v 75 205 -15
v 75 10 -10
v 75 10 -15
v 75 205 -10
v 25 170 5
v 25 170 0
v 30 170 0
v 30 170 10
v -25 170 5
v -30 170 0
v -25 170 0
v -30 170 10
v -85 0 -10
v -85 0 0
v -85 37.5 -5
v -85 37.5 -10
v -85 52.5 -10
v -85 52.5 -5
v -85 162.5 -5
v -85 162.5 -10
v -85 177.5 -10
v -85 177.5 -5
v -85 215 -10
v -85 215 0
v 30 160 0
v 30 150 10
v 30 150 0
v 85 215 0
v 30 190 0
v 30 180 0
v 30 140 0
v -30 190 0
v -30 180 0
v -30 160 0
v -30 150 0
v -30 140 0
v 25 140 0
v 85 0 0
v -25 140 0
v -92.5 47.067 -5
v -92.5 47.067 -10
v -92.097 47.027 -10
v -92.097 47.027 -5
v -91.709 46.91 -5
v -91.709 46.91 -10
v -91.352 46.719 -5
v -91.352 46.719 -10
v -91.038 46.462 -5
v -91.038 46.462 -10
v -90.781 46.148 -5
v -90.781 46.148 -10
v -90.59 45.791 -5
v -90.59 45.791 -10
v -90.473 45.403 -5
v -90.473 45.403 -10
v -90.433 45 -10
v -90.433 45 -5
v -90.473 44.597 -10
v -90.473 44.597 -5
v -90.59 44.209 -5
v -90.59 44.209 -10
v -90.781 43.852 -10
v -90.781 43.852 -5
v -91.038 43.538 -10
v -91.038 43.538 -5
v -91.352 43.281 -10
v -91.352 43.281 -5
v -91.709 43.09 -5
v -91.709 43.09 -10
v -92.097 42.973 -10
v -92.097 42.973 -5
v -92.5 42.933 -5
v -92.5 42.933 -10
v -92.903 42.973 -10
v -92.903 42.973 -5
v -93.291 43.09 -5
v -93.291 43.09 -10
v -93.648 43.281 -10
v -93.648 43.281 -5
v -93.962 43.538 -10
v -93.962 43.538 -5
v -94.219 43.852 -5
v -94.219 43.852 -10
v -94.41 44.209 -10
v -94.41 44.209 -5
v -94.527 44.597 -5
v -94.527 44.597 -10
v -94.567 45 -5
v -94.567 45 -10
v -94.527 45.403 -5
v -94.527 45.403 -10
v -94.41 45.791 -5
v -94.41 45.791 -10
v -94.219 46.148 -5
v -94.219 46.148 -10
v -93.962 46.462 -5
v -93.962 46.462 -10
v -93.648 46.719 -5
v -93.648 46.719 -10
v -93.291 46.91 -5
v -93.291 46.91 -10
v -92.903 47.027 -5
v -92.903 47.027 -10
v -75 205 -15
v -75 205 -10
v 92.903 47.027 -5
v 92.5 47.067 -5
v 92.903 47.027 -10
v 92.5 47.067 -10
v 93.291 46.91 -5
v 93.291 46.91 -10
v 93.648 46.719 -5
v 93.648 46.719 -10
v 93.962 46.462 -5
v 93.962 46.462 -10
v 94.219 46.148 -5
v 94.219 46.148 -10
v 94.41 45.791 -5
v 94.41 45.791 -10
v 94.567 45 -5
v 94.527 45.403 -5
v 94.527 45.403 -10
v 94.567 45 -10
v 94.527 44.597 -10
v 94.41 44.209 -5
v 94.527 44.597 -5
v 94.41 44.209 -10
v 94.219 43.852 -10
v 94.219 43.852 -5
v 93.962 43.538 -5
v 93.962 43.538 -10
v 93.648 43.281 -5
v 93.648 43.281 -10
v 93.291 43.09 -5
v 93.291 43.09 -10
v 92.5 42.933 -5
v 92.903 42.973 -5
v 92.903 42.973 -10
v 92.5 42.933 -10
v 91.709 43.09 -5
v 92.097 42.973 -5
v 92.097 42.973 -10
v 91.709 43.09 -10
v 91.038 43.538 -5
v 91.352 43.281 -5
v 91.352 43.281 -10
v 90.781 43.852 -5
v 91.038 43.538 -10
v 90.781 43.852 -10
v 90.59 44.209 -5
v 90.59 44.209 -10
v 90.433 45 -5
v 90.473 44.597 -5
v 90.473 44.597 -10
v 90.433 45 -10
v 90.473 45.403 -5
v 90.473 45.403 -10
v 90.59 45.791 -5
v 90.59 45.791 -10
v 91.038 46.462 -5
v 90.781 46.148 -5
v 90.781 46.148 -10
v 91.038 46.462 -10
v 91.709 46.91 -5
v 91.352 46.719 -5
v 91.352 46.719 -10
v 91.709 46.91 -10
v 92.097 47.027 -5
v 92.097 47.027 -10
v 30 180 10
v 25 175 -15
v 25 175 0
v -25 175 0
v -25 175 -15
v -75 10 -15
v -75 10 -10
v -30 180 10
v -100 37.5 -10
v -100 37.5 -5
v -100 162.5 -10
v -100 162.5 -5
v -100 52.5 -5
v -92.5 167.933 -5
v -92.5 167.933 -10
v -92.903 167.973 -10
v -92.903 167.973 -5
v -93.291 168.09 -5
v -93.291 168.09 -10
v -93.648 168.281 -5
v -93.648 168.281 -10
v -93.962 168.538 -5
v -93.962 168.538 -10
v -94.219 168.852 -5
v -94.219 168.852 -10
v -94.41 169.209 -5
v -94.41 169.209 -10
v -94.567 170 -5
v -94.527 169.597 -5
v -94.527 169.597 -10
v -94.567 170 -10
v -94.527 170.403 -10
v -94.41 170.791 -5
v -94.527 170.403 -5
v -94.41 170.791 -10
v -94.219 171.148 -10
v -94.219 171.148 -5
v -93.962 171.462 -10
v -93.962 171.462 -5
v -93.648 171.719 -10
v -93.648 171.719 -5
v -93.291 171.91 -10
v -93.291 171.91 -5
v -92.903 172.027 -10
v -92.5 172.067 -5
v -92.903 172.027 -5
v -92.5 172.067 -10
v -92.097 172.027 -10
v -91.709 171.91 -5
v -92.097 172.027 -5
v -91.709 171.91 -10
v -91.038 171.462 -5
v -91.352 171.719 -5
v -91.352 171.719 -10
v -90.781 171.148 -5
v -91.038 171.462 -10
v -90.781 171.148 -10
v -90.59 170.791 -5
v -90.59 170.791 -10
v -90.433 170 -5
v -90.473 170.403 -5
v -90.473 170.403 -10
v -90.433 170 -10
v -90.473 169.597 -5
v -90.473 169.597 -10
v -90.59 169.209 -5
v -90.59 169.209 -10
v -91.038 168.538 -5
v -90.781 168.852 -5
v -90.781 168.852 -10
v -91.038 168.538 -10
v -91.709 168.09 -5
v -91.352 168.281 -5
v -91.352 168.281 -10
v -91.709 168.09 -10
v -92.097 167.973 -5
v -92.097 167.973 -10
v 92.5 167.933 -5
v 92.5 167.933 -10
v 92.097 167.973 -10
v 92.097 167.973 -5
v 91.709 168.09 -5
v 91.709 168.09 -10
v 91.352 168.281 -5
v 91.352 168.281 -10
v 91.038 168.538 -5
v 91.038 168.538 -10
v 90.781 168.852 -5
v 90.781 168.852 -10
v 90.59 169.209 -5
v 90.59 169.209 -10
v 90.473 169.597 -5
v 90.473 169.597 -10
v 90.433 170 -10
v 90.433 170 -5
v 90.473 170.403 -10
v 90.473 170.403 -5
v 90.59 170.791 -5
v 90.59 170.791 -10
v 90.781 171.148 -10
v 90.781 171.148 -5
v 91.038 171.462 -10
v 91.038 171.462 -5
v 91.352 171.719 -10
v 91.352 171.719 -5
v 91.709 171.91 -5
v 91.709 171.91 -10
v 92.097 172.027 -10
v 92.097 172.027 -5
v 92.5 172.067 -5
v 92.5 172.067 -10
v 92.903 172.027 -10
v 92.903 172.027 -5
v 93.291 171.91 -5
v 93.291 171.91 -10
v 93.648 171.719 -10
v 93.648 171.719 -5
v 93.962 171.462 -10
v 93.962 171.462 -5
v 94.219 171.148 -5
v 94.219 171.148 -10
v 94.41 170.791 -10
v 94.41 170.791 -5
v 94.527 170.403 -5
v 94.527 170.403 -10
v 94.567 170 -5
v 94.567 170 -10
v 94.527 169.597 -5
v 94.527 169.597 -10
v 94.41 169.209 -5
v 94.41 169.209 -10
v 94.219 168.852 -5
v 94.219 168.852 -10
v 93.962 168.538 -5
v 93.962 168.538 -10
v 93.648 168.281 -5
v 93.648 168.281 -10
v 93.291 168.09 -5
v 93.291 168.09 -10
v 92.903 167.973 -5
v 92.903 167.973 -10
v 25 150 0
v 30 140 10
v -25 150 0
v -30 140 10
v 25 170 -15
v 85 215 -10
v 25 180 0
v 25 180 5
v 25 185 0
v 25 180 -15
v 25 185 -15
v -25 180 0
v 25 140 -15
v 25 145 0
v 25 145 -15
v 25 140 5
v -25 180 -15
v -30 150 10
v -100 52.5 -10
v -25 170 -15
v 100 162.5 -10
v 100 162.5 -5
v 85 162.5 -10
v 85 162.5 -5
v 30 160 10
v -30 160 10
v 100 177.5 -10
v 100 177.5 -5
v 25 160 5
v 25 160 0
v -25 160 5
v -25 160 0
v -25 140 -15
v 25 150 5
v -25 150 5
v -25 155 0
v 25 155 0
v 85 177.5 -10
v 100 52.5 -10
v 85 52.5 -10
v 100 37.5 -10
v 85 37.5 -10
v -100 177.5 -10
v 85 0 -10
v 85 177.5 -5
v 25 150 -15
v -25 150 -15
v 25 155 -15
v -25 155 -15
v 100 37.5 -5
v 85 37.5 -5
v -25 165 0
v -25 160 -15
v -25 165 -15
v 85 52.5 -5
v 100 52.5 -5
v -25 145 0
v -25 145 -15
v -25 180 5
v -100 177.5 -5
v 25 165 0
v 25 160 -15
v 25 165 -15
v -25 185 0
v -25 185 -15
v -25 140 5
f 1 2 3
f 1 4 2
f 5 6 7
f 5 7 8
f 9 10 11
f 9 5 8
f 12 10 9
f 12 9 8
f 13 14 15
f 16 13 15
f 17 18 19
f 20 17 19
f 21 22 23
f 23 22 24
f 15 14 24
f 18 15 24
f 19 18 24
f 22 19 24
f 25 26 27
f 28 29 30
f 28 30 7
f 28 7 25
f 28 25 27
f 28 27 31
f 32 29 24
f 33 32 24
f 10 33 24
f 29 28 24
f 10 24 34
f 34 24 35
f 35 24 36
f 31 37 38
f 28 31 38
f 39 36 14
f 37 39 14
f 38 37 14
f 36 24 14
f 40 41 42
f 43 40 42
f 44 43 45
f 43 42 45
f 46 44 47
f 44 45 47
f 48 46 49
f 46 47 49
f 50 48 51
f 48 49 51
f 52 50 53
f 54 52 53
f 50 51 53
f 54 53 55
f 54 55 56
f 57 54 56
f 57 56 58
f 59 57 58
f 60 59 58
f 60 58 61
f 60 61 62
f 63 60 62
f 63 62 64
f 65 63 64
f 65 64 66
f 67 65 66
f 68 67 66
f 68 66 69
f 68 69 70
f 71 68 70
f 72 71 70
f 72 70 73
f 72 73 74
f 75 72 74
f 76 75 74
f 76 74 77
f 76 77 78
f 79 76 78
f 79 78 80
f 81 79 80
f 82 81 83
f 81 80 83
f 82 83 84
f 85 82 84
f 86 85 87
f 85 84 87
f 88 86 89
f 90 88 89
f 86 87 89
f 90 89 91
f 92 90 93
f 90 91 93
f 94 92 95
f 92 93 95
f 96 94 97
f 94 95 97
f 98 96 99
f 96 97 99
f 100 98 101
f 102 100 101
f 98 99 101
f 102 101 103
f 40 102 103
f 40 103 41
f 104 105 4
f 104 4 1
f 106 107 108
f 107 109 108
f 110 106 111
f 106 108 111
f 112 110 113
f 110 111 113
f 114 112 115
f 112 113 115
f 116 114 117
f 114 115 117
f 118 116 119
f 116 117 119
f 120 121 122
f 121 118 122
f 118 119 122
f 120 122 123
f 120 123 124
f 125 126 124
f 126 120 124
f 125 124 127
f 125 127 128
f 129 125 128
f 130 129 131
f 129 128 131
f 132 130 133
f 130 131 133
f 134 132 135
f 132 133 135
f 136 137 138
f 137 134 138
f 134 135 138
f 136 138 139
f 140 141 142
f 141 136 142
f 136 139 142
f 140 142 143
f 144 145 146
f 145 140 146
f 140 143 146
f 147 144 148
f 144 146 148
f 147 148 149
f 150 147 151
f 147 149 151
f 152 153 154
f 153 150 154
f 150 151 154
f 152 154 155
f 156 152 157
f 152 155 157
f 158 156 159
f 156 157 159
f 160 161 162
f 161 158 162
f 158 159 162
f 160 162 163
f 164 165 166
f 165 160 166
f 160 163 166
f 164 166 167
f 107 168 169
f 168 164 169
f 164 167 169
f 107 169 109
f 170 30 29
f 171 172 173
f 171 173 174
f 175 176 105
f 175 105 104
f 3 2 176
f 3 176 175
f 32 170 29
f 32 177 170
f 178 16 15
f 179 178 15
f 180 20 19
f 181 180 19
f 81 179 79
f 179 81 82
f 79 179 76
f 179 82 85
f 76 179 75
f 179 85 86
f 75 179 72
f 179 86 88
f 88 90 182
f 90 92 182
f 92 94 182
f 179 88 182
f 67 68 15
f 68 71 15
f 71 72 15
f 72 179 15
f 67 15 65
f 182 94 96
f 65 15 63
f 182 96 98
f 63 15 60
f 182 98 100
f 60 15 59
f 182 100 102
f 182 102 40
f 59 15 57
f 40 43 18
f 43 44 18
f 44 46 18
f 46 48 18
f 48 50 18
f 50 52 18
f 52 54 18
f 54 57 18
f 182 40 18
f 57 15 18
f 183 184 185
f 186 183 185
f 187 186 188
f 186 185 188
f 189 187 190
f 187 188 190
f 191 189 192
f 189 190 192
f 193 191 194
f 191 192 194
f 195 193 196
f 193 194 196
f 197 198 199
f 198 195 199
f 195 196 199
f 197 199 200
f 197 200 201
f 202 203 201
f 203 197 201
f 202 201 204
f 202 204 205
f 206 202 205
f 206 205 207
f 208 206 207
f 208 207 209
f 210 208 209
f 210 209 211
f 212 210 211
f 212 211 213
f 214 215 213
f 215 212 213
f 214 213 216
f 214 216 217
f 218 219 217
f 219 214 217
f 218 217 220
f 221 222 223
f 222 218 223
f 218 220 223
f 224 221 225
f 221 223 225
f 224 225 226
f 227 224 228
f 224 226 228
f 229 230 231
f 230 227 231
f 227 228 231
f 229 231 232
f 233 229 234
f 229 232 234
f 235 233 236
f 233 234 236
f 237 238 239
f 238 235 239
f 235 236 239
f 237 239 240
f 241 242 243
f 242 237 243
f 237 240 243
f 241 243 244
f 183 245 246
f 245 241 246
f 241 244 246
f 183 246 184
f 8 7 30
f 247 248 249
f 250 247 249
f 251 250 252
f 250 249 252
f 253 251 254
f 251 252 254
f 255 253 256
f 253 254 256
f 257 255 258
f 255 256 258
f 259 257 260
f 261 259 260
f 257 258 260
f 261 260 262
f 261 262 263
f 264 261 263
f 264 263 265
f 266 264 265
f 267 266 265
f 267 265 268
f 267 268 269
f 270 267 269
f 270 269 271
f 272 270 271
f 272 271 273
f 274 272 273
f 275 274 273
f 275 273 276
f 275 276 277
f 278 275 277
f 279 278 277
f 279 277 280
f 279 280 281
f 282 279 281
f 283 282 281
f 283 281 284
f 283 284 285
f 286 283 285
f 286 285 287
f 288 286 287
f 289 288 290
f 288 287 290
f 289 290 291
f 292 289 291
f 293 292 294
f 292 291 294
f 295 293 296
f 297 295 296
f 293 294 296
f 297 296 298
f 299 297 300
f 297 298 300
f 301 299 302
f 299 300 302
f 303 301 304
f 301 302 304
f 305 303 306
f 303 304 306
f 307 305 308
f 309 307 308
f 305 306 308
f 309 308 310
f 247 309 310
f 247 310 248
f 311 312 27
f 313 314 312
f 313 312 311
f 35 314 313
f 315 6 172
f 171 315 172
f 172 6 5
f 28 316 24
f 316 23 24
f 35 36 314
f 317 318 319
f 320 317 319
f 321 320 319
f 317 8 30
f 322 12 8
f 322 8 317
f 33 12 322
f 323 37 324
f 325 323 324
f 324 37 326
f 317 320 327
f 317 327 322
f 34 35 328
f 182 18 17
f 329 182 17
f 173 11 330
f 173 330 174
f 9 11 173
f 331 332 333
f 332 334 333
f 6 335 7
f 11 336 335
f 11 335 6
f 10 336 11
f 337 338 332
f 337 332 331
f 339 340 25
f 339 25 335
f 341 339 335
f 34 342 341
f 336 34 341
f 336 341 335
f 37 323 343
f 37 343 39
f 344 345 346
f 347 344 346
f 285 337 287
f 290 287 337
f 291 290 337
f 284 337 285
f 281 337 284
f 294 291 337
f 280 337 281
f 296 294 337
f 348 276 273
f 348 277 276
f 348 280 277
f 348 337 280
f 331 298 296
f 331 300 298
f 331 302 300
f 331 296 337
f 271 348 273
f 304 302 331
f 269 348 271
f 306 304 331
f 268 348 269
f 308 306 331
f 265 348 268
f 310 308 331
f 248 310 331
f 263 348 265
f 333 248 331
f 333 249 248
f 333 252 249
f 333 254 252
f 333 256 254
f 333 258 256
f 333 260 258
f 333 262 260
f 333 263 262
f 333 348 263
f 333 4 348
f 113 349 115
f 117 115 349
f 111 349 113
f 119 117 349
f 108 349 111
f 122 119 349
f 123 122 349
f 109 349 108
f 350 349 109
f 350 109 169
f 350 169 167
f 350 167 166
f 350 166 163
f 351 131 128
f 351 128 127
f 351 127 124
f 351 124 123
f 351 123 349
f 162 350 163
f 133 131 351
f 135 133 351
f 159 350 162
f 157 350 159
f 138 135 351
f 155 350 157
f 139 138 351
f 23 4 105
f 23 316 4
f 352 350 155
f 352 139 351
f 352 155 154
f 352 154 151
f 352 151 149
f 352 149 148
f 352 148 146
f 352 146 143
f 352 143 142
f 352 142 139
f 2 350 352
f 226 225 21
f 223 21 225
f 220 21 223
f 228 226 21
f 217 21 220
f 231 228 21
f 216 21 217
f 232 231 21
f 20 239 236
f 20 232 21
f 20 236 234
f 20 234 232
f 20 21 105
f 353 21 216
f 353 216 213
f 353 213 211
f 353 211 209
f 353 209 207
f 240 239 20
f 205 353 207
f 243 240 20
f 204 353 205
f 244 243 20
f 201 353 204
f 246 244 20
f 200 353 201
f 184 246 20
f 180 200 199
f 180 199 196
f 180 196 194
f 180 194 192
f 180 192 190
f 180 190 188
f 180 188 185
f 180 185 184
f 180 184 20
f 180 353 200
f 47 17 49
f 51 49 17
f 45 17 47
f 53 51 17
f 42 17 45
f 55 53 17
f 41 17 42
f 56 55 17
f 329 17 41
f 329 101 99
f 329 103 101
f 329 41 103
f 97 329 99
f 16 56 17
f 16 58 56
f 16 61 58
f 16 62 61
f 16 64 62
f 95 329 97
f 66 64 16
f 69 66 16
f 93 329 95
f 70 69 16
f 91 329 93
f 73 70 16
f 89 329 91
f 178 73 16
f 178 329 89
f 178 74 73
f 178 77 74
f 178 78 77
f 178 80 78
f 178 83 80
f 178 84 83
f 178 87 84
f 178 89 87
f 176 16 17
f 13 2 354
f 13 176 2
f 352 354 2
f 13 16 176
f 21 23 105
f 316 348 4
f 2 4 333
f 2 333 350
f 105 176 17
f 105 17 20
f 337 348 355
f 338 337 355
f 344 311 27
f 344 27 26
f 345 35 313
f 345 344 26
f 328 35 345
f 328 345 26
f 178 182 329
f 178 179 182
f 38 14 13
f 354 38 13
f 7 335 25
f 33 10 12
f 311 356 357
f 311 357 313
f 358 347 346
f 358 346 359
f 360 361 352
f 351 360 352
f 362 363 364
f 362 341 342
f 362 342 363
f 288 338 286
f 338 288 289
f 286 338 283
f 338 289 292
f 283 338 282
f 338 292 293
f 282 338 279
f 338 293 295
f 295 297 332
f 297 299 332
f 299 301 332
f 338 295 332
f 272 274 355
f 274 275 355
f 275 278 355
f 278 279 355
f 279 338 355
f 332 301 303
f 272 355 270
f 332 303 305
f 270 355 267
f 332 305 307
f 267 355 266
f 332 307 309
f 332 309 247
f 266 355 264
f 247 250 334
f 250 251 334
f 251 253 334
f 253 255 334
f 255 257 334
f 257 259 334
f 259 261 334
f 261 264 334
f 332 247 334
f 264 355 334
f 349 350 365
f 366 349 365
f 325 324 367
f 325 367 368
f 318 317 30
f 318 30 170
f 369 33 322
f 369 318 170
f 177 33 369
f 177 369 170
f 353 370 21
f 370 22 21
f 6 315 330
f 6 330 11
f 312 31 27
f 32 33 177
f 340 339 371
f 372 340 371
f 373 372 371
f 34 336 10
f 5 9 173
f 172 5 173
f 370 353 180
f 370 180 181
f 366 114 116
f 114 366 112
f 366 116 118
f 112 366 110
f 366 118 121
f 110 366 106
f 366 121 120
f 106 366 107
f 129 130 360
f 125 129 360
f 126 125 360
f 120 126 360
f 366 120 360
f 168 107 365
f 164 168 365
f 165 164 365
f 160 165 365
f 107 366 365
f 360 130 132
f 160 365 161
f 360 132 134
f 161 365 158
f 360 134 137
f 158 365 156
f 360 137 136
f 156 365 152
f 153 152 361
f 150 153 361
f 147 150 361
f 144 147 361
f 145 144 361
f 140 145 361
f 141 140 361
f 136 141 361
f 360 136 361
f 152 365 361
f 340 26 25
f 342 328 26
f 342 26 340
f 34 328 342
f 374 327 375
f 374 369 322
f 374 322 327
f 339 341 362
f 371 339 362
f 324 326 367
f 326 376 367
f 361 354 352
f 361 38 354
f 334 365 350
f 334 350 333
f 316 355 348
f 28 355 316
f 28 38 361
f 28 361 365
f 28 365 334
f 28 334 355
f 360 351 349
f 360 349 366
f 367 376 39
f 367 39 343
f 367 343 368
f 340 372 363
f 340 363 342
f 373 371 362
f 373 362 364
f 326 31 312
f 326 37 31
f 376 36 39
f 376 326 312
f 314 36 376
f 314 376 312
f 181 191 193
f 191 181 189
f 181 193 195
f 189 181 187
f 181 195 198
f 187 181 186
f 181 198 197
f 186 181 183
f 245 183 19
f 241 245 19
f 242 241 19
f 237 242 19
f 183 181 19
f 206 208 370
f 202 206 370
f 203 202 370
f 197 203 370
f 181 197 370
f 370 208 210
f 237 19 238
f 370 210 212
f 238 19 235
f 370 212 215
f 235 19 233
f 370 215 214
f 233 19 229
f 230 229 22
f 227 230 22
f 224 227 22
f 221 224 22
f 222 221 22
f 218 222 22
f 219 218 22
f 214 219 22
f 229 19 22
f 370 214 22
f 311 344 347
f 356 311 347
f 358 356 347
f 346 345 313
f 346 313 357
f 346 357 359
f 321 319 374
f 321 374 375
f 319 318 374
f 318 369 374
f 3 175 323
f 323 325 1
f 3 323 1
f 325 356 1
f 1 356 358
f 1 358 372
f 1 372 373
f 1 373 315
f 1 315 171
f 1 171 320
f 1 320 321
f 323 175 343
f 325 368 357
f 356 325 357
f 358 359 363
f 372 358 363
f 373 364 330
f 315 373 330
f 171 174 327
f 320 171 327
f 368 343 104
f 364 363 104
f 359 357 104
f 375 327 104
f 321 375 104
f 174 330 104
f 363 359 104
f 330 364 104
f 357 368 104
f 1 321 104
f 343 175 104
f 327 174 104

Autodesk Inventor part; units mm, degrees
sketch "Sketch1" plane through (0, 0, 0) normal (1, 0, 0) x (0, 1, 0)
  line L0 (215, 0) -> (0, 0)
  line L1 (0, 0) -> (0, -15)
  line L2 (0, -15) -> (215, -15)
  line L3 (215, -15) -> (215, 0)
  dimension "d0" = 15
  dimension "d1" = 215
extrude "Extrusion1" add sketch "Sketch1" along normal mid plane 170
sketch "Sketch2" plane through (85, 0, 0) normal (1, 0, 0) x (0, 0, -1)
  line L0 (15, 0) -> (15, 215) projected
  line L1 (15, 215) -> (0, 215) projected
  line L2 (15, 215) -> (10, 215)
  line L3 (10, 215) -> (10, 205)
  line L4 (10, 205) -> (15, 205)
  line L5 (15, 205) -> (15, 215)
  point P0 (0, 0)
  point P1 (12.5, 215)
  point P2 (12.5, 205)
  point P3 (15, 210)
  point P4 (10, 210)
  point P5 (15, 205)
  dimension "d4" = 10
  dimension "d5" = 5
sketch3d "3D Sketch1"
  line L0 (85, 215, -15) -> (-85, 215, -15)
  line L1 (-85, 215, -15) -> (-85, 0, -15)
  line L2 (-85, 0, -15) -> (85, 0, -15)
  line L3 (85, 0, -15) -> (85, 215, -15)
sweep "Sweep1" cut profiles "Sketch2" path "3D Sketch1"
ref_plane "Work Plane1" through (0, 0, 0) normal (1, 0, 0) x (0, 1, 0)
sketch "Sketch3" plane through (0, 0, 0) normal (1, 0, 0) x (0, 1, 0)
  line L0 (0, 0) -> (215, 0) projected
  line L1 (190, 0) -> (180, 0)
  line L2 (180, 0) -> (180, 10)
  line L3 (180, 10) -> (190, 0)
  point P0 (180, 5)
  dimension "d9" = 25
  dimension "d10" = 10
  dimension "d11" = 10
extrude "Extrusion2" add sketch "Sketch3" along normal mid plane 60
sketch "Sketch4" plane through (0, 0, 0) normal (1, 0, 0) x (0, 1, 0)
  line L0 (10, -15) -> (205, -15) projected
  line L1 (180, -15) -> (180, 5)
  line L2 (180, 5) -> (185, 0)
  line L3 (185, 0) -> (185, -15)
  line L4 (185, -15) -> (180, -15)
  line L5 (180, 10) -> (190, 0) projected
  point P0 (0, 0)
  dimension "d14" = 5
  dimension "d15" = 5
extrude "Extrusion3" cut sketch "Sketch4" along normal mid plane 50
pattern_linear "Rectangular Pattern1" count 5 spacing 10 along (0, -1, 0) of "Extrusion2", "Extrusion3"
sketch "Sketch5" plane through (85, 0, 0) normal (1, 0, 0) x (0, 0, -1)
  line L0 (10, 0) -> (10, 215) projected
  line L1 (10, 10) -> (10, 205) projected
  line L2 (10, 177.5) -> (5, 177.5)
  line L3 (5, 177.5) -> (5, 162.5)
  line L4 (5, 162.5) -> (10, 162.5)
  line L5 (10, 162.5) -> (10, 177.5)
  point P0 (0, 0)
  point P1 (7.5, 177.5)
  point P2 (10, 177.5)
  point P3 (7.5, 162.5)
  dimension "d22" = 5
  dimension "d23" = 15
  dimension "d39" = 52.5
extrude "Extrusion4" add sketch "Sketch5" along normal blind 15
sketch "Sketch6" plane through (85, 162.5, -5) normal (0, 0, 1) x (1, 0, 0)
  line L0 (0, 15) -> (15, 15) projected
  line L1 (15, 15) -> (15, 0) projected
  point P0 (-85, -162.5)
  point P1 (7.5, 7.5)
  point P2 (7.5, 15)
  point P3 (15, 7.5)
  dimension "d26" = 7.5
  dimension "d27" = 7.5
hole "Hole1" at (92.5, 170, -5) direction (0, 0, -1) diameter 4.134 depth 5
ref_plane "Work Plane2" through (0, 107.5, 0) normal (0, 1, 0) x (-1, 0, 0)
mirror "Mirror1" about plane through (0, 107.5, 0) normal (0, 1, 0) of "Extrusion4", "Hole1"
ref_plane "Work Plane3" through (0, 0, 0) normal (0, 1, 0) x (-1, 0, 0)
ref_plane "Work Plane5" through (0, 0, 0) normal (1, 0, 0) x (0, 1, 0)
mirror "Mirror2" about plane through (0, 0, 0) normal (1, 0, 0) of "Extrusion4", "Hole1", "Mirror1"
properties part number "caseDoor"
